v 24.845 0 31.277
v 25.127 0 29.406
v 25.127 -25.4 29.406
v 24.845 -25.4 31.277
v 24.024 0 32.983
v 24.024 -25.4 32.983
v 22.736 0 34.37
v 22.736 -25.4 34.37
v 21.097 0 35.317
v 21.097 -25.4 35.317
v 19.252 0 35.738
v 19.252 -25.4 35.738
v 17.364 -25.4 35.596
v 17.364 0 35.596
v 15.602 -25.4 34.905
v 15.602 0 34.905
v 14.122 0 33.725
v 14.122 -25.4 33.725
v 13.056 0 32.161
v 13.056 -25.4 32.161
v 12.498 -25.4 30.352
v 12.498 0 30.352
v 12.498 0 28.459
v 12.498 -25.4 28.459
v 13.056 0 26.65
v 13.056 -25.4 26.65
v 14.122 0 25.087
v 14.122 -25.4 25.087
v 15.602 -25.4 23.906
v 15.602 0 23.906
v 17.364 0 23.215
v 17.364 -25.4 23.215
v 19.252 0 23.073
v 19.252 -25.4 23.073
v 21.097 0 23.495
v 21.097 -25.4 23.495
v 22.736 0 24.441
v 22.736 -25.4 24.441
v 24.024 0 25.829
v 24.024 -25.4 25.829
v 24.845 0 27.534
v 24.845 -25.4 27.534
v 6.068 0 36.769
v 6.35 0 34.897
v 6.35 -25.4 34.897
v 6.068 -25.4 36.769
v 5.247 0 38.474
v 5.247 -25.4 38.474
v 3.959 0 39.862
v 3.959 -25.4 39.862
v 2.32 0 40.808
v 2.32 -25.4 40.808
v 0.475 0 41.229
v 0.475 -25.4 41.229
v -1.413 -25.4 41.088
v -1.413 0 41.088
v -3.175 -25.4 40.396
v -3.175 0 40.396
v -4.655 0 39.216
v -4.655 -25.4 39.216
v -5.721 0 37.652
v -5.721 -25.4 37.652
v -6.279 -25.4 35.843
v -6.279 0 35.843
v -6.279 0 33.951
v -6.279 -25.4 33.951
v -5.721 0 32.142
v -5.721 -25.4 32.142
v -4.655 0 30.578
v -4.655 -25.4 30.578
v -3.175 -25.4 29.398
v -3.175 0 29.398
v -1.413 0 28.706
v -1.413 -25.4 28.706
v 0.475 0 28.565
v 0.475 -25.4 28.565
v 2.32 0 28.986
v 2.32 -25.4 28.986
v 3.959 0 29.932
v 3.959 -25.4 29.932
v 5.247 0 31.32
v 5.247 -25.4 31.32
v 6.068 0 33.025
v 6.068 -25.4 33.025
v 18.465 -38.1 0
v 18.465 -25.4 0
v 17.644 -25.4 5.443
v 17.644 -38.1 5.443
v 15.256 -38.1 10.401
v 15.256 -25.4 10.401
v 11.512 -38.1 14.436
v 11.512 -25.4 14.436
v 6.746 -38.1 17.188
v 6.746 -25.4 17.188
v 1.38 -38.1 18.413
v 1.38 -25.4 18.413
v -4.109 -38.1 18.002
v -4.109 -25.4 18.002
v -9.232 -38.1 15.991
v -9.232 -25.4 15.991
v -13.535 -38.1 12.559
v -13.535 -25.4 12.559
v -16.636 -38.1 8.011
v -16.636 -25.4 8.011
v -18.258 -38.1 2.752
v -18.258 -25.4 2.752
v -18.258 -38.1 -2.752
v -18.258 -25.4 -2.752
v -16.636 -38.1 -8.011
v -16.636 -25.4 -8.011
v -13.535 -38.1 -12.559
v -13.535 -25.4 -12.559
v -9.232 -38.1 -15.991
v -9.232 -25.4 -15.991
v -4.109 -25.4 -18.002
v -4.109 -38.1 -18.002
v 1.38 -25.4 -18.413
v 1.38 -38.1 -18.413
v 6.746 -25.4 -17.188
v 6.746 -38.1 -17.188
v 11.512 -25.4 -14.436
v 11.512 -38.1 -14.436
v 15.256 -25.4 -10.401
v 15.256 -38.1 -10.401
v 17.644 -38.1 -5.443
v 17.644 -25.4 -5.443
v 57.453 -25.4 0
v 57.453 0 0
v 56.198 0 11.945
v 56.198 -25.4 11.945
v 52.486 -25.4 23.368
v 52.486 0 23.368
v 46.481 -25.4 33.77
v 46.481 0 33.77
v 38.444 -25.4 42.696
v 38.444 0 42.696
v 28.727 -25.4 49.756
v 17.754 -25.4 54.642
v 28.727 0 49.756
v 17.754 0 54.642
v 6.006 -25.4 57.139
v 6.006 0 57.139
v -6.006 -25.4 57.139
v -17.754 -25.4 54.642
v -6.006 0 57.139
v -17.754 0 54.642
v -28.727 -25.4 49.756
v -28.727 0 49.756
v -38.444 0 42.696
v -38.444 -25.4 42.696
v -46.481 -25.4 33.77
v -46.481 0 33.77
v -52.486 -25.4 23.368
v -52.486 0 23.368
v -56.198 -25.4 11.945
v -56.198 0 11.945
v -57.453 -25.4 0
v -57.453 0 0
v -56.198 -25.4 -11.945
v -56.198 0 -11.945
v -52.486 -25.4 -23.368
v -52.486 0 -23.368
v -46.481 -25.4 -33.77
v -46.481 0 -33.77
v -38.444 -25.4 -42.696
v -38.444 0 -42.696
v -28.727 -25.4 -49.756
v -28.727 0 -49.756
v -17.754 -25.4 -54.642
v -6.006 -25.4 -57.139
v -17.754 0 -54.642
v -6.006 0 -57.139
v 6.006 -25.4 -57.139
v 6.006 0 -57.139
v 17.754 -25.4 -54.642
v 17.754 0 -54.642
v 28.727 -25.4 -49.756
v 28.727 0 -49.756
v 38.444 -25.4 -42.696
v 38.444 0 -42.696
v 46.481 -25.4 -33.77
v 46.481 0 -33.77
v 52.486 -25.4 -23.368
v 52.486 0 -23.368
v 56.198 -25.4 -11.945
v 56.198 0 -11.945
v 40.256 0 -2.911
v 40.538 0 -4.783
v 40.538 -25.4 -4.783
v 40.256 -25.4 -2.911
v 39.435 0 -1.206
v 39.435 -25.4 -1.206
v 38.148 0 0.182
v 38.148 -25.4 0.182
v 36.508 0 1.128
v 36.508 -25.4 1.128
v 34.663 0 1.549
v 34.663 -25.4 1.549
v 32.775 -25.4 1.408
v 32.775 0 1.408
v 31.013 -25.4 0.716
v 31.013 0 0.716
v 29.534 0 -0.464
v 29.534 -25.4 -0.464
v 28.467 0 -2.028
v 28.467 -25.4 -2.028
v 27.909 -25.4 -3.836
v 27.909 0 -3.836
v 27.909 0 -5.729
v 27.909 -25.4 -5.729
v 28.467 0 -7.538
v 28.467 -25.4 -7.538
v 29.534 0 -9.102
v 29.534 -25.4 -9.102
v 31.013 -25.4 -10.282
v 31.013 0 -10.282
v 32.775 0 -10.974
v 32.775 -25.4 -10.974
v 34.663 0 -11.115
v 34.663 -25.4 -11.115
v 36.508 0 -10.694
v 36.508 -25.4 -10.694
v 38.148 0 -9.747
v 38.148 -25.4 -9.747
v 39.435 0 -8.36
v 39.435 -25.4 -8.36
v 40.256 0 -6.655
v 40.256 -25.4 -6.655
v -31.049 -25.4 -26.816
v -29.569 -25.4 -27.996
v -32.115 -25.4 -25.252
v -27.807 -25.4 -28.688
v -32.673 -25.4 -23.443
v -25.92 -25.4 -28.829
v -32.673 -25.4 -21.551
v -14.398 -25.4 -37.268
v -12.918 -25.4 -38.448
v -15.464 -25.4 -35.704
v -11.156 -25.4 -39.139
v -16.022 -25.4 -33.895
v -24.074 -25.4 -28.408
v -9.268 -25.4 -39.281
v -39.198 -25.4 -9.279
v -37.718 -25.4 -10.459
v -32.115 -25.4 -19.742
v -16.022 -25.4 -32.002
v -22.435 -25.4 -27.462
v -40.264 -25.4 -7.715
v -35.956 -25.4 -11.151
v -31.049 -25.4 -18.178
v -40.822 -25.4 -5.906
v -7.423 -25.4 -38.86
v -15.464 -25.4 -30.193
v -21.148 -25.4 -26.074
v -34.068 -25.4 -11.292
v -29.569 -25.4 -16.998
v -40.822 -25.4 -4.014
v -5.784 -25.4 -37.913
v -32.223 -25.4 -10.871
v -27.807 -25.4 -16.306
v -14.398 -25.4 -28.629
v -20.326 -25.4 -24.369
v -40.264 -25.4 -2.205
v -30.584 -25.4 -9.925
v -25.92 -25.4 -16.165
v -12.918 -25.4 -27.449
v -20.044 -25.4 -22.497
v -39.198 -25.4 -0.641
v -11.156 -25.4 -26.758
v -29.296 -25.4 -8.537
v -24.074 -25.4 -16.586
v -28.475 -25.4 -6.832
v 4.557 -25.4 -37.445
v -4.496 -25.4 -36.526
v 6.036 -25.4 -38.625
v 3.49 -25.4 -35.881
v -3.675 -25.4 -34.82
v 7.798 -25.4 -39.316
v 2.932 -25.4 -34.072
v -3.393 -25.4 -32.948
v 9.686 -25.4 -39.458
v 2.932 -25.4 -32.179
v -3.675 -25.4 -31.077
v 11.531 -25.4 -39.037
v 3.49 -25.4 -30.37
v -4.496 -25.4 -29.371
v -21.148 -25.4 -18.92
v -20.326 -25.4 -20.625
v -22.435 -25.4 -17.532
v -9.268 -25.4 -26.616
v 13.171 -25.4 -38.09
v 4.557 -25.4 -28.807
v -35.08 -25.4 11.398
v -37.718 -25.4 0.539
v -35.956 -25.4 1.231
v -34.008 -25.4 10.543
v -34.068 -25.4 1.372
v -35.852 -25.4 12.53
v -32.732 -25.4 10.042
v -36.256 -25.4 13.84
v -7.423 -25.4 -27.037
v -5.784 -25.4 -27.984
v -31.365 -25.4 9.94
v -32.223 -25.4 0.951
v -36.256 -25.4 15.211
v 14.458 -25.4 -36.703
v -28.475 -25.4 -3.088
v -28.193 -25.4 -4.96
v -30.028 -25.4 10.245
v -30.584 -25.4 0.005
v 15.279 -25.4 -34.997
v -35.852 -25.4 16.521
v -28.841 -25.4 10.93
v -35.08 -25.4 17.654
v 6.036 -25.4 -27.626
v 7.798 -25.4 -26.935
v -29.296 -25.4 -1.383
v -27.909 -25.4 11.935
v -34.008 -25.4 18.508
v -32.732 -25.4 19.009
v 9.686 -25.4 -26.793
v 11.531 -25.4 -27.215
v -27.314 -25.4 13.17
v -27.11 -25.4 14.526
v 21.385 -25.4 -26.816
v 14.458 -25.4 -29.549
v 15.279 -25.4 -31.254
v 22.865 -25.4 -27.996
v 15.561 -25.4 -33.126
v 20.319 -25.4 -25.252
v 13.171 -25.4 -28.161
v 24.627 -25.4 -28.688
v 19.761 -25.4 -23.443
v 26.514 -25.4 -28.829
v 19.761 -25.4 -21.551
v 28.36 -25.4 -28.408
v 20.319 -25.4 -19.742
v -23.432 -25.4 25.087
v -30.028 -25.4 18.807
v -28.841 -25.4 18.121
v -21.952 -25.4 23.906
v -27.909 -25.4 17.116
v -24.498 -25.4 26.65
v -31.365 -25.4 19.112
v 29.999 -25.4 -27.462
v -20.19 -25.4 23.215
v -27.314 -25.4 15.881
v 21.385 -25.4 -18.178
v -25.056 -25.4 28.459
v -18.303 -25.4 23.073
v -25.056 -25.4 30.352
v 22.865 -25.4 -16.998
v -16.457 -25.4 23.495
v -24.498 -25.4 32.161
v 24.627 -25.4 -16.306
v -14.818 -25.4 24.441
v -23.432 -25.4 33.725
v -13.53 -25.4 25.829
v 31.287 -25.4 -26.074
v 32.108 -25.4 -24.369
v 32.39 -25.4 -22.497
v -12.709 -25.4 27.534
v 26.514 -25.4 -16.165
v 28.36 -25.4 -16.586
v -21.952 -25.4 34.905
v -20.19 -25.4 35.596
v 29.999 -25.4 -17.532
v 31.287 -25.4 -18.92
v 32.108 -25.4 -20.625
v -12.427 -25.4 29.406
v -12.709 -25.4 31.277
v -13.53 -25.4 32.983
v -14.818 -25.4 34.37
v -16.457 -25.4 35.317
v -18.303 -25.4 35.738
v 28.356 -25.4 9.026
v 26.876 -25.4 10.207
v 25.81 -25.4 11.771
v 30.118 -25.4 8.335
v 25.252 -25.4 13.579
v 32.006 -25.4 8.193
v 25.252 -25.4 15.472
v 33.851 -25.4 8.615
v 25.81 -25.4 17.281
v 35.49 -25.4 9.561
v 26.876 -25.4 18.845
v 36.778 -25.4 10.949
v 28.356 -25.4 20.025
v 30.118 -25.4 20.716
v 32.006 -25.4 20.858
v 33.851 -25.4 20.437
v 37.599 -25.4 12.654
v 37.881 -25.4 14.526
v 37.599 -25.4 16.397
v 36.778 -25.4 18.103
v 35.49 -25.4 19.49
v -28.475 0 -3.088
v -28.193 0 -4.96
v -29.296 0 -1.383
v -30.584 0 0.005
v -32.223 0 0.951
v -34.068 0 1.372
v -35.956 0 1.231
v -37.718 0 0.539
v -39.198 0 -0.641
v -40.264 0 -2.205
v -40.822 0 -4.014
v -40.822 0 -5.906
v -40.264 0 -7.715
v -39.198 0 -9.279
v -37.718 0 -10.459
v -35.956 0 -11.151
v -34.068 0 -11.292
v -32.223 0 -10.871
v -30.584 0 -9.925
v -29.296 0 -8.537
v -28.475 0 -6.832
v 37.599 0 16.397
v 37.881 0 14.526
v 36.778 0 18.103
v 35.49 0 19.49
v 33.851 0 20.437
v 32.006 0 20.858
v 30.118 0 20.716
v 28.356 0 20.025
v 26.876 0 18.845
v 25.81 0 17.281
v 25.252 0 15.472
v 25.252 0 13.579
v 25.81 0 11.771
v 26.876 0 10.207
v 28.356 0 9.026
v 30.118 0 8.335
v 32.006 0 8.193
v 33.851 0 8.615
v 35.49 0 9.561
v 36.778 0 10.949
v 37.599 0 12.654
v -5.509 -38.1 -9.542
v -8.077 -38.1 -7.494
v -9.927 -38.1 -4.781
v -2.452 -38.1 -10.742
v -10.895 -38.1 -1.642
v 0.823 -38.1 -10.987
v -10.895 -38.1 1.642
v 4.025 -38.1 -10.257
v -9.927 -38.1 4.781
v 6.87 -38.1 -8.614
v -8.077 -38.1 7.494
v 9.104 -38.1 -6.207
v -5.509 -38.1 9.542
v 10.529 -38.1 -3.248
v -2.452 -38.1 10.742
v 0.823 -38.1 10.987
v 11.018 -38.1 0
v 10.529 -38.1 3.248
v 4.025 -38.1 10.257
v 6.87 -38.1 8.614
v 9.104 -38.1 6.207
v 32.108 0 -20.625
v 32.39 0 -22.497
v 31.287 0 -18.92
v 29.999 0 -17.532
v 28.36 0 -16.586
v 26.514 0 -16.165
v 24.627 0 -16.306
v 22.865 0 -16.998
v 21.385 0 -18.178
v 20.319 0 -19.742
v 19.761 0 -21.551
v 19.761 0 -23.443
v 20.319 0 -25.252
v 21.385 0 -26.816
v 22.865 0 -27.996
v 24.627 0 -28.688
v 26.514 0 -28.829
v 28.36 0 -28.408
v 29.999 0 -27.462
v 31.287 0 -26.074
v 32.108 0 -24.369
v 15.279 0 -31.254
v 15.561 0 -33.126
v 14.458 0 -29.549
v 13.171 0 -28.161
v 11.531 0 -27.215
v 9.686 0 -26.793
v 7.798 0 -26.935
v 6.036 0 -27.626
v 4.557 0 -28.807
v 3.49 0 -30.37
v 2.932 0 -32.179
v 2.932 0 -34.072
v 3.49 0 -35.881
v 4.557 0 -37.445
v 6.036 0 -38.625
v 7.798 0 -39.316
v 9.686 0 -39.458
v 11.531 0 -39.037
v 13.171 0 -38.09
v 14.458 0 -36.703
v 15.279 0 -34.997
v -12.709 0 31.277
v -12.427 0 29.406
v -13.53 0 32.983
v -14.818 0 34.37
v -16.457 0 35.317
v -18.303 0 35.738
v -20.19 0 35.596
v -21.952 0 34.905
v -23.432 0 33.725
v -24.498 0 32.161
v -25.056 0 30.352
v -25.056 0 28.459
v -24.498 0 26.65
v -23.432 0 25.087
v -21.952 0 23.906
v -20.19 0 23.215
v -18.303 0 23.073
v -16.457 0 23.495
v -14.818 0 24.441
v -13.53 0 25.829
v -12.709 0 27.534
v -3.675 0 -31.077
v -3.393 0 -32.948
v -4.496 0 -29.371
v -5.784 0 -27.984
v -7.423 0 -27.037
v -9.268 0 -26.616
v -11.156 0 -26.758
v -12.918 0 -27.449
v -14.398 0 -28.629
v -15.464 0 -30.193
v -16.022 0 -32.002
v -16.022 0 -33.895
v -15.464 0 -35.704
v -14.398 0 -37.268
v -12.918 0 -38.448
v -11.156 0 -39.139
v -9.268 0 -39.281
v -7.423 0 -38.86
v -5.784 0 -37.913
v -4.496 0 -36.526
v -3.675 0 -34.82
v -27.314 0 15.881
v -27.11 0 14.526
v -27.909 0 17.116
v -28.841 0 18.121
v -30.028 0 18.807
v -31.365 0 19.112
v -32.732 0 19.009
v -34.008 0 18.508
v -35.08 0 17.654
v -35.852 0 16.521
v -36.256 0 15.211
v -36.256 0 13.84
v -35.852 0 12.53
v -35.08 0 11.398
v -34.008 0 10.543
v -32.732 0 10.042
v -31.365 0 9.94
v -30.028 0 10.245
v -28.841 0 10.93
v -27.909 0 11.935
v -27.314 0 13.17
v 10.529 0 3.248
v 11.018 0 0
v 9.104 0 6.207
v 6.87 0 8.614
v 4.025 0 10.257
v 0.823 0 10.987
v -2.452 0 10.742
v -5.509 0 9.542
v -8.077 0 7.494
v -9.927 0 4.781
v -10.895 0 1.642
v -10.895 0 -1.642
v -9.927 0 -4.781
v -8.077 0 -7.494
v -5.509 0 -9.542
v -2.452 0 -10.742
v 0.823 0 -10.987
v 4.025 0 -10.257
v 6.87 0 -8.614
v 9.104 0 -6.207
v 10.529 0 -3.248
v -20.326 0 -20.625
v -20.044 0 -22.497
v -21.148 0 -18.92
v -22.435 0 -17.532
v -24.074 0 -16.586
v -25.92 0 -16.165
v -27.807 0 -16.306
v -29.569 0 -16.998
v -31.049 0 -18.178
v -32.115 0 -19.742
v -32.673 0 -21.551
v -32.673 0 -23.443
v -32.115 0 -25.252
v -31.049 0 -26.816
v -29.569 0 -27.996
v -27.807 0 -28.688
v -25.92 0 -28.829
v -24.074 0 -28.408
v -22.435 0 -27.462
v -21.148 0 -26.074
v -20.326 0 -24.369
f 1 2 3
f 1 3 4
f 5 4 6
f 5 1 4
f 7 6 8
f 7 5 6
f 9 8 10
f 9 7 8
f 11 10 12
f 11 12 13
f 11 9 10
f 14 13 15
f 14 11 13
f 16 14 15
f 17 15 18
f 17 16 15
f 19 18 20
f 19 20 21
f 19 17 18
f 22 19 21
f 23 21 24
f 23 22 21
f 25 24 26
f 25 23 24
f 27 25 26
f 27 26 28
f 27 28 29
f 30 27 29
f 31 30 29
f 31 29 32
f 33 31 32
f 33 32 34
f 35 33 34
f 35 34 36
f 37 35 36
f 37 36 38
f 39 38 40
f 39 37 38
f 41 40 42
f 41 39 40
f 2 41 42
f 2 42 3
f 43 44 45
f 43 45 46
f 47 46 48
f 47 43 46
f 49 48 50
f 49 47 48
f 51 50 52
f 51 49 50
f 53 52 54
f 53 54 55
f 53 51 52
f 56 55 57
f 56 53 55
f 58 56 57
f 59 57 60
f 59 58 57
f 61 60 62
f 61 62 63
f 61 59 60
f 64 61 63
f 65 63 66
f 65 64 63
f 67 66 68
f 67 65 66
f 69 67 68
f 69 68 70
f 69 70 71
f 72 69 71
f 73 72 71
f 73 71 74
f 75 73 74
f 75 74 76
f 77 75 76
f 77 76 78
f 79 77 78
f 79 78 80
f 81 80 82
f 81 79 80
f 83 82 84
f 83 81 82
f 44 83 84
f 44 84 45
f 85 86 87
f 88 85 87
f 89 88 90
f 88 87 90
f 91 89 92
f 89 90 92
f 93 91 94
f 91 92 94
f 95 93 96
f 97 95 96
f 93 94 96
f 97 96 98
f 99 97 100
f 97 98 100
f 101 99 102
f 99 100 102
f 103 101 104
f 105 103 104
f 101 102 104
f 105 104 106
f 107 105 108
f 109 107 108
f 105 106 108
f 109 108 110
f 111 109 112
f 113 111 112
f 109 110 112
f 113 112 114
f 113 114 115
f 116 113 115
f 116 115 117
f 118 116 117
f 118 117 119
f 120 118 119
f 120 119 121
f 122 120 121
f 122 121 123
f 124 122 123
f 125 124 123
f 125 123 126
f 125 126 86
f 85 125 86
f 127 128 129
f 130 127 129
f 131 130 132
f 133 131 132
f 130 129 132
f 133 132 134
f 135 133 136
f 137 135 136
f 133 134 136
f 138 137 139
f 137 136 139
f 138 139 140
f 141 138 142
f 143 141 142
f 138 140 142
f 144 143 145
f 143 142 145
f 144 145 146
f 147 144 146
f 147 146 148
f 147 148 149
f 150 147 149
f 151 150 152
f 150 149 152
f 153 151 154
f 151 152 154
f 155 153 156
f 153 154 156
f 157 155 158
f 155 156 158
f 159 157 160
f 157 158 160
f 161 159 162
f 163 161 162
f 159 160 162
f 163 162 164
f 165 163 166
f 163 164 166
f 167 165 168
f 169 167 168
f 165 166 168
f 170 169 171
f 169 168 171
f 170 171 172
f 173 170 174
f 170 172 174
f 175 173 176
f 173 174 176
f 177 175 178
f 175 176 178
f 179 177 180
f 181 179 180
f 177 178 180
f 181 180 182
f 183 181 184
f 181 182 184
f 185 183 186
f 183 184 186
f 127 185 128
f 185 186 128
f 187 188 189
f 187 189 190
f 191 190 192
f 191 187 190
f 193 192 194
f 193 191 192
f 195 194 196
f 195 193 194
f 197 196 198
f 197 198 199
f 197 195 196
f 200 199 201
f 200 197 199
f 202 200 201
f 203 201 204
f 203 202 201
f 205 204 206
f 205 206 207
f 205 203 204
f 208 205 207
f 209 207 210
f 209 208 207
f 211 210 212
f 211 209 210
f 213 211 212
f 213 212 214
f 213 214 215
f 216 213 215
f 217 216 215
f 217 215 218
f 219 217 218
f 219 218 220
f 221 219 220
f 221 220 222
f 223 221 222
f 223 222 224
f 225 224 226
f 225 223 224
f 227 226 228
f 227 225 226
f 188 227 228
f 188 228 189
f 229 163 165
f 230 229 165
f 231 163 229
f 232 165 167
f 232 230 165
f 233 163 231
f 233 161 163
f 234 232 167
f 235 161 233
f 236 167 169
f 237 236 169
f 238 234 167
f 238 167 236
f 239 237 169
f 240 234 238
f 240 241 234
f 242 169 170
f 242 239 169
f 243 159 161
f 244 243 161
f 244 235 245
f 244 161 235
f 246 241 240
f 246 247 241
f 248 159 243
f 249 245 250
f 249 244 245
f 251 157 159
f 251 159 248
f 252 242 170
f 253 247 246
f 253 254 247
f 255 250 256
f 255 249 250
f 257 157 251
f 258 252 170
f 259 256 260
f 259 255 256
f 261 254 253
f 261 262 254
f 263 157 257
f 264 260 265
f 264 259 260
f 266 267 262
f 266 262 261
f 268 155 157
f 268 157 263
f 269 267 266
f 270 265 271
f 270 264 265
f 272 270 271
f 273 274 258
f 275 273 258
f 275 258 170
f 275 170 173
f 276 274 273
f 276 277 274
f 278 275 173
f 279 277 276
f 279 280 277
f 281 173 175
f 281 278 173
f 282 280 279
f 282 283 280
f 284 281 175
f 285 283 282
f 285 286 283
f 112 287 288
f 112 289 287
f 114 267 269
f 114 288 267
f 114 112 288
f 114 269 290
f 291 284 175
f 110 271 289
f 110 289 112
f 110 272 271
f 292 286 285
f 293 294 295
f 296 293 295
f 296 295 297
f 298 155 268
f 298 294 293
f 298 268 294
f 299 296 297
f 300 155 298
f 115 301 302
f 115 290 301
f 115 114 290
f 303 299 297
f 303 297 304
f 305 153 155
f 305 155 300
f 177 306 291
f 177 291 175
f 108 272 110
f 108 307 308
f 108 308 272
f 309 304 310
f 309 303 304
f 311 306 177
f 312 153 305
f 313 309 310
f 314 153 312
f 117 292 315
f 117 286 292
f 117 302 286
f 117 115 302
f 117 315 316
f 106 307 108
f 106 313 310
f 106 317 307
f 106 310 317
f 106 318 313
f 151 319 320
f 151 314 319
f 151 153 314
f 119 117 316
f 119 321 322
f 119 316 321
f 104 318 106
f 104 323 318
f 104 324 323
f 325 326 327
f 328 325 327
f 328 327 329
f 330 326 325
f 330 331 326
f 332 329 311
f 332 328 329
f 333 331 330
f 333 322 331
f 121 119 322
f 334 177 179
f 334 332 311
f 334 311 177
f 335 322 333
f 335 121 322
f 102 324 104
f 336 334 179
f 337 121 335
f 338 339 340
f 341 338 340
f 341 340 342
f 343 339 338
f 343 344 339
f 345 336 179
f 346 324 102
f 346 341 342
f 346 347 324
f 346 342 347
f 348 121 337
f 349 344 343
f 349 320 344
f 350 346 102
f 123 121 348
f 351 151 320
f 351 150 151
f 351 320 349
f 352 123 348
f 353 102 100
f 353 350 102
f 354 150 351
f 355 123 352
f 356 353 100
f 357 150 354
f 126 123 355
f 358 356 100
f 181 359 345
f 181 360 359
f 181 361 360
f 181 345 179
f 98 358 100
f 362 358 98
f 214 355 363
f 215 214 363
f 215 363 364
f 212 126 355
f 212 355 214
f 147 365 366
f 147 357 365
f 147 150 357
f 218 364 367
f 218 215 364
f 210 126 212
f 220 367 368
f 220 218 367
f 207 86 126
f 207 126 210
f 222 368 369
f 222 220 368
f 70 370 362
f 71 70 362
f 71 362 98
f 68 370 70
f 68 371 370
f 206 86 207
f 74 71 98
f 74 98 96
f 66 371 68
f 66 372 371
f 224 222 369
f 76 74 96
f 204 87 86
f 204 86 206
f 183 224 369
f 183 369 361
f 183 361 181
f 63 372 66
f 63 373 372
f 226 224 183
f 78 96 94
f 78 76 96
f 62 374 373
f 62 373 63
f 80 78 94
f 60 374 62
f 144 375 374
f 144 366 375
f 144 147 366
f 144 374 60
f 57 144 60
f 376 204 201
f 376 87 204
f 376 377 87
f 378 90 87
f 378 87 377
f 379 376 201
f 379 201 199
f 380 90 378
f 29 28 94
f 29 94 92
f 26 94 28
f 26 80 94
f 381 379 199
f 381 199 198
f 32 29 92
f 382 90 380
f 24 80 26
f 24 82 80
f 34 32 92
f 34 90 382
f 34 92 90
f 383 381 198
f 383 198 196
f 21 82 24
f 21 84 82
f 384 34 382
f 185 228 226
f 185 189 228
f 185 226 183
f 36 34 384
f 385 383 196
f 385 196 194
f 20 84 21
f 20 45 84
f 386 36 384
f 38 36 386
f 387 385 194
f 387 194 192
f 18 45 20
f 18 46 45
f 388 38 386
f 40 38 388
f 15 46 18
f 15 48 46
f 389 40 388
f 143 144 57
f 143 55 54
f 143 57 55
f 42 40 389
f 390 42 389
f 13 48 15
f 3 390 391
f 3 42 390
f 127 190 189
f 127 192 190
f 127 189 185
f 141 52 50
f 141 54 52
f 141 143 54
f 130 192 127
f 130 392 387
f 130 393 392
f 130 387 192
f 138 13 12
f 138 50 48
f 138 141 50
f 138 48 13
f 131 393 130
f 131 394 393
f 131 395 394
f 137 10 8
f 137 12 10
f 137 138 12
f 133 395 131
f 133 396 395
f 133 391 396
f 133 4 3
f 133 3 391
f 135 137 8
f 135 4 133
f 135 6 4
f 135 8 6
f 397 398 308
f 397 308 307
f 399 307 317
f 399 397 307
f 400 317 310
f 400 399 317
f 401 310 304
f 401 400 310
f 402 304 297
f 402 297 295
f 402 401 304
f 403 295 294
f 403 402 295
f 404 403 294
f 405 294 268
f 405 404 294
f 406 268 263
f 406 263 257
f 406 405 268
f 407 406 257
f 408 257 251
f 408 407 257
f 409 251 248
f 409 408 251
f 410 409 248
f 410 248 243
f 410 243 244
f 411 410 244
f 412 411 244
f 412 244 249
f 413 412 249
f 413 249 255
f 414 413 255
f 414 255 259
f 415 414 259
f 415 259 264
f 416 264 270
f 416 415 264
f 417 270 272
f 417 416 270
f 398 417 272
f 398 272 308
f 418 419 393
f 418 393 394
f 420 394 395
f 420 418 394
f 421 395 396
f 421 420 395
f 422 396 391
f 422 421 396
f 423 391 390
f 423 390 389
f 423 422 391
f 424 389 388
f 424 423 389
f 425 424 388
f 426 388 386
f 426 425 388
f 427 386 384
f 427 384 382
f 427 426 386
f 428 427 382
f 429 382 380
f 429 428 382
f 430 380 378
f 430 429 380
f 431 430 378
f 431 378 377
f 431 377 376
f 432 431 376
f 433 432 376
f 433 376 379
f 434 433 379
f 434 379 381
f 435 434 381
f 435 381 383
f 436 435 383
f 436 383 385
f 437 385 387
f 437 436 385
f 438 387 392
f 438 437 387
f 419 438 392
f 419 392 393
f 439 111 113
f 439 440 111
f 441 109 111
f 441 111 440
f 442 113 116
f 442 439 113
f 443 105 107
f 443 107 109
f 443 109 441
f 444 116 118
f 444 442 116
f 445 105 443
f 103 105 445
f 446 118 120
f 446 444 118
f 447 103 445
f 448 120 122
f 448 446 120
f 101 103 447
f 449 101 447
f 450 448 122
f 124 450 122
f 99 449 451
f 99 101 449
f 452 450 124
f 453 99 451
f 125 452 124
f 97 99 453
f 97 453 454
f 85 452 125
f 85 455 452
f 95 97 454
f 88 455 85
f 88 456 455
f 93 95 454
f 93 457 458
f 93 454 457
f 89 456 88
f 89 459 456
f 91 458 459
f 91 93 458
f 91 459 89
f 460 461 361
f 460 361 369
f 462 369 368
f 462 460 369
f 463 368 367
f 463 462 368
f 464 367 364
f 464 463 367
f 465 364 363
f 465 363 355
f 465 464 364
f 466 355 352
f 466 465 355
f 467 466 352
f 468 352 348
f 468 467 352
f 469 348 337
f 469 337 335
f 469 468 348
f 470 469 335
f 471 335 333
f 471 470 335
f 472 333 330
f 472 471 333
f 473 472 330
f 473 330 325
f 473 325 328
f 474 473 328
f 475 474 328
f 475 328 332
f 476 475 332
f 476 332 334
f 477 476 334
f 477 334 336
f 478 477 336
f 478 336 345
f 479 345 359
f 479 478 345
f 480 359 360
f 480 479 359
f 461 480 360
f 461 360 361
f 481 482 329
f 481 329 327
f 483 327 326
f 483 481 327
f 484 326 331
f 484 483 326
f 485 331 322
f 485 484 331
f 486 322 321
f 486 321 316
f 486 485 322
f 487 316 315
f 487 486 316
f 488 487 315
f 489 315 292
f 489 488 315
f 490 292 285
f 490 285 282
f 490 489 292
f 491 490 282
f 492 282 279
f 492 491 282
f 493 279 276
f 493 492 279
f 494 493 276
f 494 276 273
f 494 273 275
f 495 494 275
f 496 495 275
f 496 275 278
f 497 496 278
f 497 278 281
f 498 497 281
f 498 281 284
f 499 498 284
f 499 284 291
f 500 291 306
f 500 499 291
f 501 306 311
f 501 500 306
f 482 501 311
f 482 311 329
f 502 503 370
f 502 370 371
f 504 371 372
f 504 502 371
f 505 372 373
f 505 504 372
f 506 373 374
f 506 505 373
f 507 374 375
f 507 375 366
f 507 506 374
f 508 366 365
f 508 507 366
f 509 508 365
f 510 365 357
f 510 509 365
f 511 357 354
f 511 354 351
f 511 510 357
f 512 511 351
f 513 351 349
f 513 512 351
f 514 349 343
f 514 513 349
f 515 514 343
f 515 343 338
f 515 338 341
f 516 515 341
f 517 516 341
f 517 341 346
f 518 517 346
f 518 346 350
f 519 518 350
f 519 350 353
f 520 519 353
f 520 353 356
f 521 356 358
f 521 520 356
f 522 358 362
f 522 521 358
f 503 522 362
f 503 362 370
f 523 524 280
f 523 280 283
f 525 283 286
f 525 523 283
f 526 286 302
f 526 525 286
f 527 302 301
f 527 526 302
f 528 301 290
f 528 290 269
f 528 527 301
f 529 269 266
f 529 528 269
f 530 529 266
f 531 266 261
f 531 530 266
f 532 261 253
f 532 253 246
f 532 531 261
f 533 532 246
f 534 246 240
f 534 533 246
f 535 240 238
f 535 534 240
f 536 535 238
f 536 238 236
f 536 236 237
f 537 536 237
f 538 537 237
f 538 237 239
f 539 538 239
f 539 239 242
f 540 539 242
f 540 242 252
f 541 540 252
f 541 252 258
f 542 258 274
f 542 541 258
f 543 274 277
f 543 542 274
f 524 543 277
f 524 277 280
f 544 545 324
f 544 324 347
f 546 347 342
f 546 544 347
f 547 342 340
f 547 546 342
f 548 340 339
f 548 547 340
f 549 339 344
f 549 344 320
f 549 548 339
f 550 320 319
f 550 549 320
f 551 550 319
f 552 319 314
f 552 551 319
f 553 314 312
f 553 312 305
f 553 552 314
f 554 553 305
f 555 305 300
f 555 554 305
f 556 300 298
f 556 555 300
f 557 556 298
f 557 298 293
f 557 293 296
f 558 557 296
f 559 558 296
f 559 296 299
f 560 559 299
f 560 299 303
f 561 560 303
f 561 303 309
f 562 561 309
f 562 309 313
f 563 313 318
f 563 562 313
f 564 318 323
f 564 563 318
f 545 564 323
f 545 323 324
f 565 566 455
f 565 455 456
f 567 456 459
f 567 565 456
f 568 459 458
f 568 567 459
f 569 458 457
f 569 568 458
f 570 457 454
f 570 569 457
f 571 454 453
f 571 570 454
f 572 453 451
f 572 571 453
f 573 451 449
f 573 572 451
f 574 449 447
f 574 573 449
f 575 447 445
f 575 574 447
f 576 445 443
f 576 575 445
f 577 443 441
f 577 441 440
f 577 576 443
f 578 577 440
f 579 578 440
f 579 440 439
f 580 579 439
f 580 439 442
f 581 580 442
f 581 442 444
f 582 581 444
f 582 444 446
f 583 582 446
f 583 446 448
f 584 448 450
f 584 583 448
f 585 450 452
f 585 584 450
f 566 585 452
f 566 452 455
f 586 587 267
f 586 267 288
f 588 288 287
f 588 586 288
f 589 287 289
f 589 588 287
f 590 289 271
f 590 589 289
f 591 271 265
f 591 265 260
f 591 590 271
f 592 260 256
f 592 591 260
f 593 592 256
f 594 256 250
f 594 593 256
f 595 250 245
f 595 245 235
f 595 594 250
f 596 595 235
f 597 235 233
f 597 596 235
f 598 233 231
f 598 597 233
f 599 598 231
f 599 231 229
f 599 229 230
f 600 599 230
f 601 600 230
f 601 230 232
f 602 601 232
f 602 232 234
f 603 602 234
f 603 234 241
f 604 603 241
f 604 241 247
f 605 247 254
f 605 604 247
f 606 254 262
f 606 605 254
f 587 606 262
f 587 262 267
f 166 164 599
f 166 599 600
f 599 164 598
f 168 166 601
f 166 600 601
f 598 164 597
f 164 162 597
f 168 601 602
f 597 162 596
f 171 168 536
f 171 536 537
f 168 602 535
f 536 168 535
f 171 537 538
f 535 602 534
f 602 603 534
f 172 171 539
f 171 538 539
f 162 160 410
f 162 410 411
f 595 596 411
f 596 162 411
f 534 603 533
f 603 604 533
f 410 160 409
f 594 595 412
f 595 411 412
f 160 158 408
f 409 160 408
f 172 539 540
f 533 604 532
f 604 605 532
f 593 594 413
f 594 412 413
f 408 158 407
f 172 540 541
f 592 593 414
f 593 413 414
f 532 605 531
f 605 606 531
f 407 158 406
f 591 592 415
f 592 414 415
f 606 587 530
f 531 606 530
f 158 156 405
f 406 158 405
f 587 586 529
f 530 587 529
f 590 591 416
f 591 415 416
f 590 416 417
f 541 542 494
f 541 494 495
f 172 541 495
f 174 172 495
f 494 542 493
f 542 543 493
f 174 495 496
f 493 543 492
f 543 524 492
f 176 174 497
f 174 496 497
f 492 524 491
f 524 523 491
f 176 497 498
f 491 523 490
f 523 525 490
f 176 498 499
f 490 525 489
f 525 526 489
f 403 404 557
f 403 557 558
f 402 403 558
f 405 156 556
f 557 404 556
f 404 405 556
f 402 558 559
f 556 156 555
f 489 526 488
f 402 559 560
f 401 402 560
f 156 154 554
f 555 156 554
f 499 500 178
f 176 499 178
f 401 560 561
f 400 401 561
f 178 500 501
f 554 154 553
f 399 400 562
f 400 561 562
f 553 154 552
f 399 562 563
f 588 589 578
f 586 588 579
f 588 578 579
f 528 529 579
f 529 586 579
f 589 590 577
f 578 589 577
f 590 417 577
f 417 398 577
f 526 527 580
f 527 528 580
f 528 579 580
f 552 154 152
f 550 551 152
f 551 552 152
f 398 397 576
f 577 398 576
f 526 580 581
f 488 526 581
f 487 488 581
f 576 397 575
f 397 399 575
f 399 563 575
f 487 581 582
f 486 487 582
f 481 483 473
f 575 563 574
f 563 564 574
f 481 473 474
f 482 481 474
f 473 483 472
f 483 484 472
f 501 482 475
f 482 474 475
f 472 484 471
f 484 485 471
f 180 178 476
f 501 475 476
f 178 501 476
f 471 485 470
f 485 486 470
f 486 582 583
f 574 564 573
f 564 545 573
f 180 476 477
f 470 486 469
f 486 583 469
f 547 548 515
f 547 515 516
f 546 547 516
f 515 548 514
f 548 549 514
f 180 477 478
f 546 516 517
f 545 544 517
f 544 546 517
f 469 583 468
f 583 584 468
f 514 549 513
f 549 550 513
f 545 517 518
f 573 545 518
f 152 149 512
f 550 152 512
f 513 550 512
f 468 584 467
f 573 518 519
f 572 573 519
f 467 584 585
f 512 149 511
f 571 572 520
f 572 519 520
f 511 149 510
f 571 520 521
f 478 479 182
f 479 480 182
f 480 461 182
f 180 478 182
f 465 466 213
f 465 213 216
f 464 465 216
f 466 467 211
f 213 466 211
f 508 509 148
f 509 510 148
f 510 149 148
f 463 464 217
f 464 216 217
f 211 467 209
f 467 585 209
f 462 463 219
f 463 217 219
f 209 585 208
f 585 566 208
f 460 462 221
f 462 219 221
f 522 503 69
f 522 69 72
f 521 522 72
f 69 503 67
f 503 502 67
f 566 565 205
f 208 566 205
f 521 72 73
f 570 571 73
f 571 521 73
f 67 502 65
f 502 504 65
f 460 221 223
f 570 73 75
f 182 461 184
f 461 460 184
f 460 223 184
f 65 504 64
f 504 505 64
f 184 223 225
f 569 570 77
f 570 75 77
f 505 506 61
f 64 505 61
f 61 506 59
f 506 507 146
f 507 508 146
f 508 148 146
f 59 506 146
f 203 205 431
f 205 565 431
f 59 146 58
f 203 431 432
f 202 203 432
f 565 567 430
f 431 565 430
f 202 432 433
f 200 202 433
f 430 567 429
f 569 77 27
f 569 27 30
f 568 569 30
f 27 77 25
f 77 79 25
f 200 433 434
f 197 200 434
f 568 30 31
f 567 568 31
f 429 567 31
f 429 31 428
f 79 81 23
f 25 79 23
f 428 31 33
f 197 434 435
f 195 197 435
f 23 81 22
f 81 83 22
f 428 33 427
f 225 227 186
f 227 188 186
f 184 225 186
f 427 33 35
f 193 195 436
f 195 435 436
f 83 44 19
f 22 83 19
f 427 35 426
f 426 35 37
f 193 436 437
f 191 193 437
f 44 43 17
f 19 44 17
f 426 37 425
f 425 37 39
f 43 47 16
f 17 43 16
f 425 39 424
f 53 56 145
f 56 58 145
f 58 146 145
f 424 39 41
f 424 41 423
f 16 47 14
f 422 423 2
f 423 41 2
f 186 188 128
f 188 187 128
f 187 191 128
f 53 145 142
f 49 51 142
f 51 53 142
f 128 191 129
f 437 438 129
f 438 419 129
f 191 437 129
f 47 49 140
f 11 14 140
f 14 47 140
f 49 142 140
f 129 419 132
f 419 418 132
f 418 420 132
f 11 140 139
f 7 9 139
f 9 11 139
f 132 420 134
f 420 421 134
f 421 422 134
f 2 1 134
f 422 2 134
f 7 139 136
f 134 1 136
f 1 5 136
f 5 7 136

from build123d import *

# Parameters (mm, degrees)
F1_R     = 57.453479
F1_R_2   = 6.35
F1_R_3   = 4.598881
F1_R_4   = 18.389548
F2_DEPTH = 25.4
F3_R     = 18.464557
F3_R_2   = 11.018284
F4_DEPTH = 38.1


with BuildPart() as f2:
    # F1 (on face) → F2 (new body)
    with BuildSketch(Plane.XZ):
        Circle(F1_R)
        with Locations((-9.742823, -32.948455)):
            Circle(F1_R_2, mode=Mode.SUBTRACT)
        with Locations((-34.542736, -4.959983)):
            Circle(F1_R_2, mode=Mode.SUBTRACT)
        with Locations((-26.394194, -22.497064)):
            Circle(F1_R_2, mode=Mode.SUBTRACT)
        with Locations((9.211395, -33.125599)):
            Circle(F1_R_2, mode=Mode.SUBTRACT)
        with Locations((26.039909, -22.497064)):
            Circle(F1_R_2, mode=Mode.SUBTRACT)
        with Locations((34.188454, -4.78284)):
            Circle(F1_R_2, mode=Mode.SUBTRACT)
        with Locations((-31.708459, 14.525663)):
            Circle(F1_R_3, mode=Mode.SUBTRACT)
        with Locations((-18.777077, 29.405612)):
            Circle(F1_R_2, mode=Mode.SUBTRACT)
        Circle(F1_R_4, mode=Mode.SUBTRACT)
        with Locations((31.531318, 14.525663)):
            Circle(F1_R_2, mode=Mode.SUBTRACT)
        with Locations((0, 34.897018)):
            Circle(F1_R_2, mode=Mode.SUBTRACT)
        with Locations((18.777075, 29.405612)):
            Circle(F1_R_2, mode=Mode.SUBTRACT)
    extrude(amount=F2_DEPTH)

    # F3 (on Front) → F4 (join)
    with BuildSketch(Plane.XZ):
        Circle(F3_R)
        Circle(F3_R_2, mode=Mode.SUBTRACT)
    extrude(amount=F4_DEPTH)


solid = f2.part
